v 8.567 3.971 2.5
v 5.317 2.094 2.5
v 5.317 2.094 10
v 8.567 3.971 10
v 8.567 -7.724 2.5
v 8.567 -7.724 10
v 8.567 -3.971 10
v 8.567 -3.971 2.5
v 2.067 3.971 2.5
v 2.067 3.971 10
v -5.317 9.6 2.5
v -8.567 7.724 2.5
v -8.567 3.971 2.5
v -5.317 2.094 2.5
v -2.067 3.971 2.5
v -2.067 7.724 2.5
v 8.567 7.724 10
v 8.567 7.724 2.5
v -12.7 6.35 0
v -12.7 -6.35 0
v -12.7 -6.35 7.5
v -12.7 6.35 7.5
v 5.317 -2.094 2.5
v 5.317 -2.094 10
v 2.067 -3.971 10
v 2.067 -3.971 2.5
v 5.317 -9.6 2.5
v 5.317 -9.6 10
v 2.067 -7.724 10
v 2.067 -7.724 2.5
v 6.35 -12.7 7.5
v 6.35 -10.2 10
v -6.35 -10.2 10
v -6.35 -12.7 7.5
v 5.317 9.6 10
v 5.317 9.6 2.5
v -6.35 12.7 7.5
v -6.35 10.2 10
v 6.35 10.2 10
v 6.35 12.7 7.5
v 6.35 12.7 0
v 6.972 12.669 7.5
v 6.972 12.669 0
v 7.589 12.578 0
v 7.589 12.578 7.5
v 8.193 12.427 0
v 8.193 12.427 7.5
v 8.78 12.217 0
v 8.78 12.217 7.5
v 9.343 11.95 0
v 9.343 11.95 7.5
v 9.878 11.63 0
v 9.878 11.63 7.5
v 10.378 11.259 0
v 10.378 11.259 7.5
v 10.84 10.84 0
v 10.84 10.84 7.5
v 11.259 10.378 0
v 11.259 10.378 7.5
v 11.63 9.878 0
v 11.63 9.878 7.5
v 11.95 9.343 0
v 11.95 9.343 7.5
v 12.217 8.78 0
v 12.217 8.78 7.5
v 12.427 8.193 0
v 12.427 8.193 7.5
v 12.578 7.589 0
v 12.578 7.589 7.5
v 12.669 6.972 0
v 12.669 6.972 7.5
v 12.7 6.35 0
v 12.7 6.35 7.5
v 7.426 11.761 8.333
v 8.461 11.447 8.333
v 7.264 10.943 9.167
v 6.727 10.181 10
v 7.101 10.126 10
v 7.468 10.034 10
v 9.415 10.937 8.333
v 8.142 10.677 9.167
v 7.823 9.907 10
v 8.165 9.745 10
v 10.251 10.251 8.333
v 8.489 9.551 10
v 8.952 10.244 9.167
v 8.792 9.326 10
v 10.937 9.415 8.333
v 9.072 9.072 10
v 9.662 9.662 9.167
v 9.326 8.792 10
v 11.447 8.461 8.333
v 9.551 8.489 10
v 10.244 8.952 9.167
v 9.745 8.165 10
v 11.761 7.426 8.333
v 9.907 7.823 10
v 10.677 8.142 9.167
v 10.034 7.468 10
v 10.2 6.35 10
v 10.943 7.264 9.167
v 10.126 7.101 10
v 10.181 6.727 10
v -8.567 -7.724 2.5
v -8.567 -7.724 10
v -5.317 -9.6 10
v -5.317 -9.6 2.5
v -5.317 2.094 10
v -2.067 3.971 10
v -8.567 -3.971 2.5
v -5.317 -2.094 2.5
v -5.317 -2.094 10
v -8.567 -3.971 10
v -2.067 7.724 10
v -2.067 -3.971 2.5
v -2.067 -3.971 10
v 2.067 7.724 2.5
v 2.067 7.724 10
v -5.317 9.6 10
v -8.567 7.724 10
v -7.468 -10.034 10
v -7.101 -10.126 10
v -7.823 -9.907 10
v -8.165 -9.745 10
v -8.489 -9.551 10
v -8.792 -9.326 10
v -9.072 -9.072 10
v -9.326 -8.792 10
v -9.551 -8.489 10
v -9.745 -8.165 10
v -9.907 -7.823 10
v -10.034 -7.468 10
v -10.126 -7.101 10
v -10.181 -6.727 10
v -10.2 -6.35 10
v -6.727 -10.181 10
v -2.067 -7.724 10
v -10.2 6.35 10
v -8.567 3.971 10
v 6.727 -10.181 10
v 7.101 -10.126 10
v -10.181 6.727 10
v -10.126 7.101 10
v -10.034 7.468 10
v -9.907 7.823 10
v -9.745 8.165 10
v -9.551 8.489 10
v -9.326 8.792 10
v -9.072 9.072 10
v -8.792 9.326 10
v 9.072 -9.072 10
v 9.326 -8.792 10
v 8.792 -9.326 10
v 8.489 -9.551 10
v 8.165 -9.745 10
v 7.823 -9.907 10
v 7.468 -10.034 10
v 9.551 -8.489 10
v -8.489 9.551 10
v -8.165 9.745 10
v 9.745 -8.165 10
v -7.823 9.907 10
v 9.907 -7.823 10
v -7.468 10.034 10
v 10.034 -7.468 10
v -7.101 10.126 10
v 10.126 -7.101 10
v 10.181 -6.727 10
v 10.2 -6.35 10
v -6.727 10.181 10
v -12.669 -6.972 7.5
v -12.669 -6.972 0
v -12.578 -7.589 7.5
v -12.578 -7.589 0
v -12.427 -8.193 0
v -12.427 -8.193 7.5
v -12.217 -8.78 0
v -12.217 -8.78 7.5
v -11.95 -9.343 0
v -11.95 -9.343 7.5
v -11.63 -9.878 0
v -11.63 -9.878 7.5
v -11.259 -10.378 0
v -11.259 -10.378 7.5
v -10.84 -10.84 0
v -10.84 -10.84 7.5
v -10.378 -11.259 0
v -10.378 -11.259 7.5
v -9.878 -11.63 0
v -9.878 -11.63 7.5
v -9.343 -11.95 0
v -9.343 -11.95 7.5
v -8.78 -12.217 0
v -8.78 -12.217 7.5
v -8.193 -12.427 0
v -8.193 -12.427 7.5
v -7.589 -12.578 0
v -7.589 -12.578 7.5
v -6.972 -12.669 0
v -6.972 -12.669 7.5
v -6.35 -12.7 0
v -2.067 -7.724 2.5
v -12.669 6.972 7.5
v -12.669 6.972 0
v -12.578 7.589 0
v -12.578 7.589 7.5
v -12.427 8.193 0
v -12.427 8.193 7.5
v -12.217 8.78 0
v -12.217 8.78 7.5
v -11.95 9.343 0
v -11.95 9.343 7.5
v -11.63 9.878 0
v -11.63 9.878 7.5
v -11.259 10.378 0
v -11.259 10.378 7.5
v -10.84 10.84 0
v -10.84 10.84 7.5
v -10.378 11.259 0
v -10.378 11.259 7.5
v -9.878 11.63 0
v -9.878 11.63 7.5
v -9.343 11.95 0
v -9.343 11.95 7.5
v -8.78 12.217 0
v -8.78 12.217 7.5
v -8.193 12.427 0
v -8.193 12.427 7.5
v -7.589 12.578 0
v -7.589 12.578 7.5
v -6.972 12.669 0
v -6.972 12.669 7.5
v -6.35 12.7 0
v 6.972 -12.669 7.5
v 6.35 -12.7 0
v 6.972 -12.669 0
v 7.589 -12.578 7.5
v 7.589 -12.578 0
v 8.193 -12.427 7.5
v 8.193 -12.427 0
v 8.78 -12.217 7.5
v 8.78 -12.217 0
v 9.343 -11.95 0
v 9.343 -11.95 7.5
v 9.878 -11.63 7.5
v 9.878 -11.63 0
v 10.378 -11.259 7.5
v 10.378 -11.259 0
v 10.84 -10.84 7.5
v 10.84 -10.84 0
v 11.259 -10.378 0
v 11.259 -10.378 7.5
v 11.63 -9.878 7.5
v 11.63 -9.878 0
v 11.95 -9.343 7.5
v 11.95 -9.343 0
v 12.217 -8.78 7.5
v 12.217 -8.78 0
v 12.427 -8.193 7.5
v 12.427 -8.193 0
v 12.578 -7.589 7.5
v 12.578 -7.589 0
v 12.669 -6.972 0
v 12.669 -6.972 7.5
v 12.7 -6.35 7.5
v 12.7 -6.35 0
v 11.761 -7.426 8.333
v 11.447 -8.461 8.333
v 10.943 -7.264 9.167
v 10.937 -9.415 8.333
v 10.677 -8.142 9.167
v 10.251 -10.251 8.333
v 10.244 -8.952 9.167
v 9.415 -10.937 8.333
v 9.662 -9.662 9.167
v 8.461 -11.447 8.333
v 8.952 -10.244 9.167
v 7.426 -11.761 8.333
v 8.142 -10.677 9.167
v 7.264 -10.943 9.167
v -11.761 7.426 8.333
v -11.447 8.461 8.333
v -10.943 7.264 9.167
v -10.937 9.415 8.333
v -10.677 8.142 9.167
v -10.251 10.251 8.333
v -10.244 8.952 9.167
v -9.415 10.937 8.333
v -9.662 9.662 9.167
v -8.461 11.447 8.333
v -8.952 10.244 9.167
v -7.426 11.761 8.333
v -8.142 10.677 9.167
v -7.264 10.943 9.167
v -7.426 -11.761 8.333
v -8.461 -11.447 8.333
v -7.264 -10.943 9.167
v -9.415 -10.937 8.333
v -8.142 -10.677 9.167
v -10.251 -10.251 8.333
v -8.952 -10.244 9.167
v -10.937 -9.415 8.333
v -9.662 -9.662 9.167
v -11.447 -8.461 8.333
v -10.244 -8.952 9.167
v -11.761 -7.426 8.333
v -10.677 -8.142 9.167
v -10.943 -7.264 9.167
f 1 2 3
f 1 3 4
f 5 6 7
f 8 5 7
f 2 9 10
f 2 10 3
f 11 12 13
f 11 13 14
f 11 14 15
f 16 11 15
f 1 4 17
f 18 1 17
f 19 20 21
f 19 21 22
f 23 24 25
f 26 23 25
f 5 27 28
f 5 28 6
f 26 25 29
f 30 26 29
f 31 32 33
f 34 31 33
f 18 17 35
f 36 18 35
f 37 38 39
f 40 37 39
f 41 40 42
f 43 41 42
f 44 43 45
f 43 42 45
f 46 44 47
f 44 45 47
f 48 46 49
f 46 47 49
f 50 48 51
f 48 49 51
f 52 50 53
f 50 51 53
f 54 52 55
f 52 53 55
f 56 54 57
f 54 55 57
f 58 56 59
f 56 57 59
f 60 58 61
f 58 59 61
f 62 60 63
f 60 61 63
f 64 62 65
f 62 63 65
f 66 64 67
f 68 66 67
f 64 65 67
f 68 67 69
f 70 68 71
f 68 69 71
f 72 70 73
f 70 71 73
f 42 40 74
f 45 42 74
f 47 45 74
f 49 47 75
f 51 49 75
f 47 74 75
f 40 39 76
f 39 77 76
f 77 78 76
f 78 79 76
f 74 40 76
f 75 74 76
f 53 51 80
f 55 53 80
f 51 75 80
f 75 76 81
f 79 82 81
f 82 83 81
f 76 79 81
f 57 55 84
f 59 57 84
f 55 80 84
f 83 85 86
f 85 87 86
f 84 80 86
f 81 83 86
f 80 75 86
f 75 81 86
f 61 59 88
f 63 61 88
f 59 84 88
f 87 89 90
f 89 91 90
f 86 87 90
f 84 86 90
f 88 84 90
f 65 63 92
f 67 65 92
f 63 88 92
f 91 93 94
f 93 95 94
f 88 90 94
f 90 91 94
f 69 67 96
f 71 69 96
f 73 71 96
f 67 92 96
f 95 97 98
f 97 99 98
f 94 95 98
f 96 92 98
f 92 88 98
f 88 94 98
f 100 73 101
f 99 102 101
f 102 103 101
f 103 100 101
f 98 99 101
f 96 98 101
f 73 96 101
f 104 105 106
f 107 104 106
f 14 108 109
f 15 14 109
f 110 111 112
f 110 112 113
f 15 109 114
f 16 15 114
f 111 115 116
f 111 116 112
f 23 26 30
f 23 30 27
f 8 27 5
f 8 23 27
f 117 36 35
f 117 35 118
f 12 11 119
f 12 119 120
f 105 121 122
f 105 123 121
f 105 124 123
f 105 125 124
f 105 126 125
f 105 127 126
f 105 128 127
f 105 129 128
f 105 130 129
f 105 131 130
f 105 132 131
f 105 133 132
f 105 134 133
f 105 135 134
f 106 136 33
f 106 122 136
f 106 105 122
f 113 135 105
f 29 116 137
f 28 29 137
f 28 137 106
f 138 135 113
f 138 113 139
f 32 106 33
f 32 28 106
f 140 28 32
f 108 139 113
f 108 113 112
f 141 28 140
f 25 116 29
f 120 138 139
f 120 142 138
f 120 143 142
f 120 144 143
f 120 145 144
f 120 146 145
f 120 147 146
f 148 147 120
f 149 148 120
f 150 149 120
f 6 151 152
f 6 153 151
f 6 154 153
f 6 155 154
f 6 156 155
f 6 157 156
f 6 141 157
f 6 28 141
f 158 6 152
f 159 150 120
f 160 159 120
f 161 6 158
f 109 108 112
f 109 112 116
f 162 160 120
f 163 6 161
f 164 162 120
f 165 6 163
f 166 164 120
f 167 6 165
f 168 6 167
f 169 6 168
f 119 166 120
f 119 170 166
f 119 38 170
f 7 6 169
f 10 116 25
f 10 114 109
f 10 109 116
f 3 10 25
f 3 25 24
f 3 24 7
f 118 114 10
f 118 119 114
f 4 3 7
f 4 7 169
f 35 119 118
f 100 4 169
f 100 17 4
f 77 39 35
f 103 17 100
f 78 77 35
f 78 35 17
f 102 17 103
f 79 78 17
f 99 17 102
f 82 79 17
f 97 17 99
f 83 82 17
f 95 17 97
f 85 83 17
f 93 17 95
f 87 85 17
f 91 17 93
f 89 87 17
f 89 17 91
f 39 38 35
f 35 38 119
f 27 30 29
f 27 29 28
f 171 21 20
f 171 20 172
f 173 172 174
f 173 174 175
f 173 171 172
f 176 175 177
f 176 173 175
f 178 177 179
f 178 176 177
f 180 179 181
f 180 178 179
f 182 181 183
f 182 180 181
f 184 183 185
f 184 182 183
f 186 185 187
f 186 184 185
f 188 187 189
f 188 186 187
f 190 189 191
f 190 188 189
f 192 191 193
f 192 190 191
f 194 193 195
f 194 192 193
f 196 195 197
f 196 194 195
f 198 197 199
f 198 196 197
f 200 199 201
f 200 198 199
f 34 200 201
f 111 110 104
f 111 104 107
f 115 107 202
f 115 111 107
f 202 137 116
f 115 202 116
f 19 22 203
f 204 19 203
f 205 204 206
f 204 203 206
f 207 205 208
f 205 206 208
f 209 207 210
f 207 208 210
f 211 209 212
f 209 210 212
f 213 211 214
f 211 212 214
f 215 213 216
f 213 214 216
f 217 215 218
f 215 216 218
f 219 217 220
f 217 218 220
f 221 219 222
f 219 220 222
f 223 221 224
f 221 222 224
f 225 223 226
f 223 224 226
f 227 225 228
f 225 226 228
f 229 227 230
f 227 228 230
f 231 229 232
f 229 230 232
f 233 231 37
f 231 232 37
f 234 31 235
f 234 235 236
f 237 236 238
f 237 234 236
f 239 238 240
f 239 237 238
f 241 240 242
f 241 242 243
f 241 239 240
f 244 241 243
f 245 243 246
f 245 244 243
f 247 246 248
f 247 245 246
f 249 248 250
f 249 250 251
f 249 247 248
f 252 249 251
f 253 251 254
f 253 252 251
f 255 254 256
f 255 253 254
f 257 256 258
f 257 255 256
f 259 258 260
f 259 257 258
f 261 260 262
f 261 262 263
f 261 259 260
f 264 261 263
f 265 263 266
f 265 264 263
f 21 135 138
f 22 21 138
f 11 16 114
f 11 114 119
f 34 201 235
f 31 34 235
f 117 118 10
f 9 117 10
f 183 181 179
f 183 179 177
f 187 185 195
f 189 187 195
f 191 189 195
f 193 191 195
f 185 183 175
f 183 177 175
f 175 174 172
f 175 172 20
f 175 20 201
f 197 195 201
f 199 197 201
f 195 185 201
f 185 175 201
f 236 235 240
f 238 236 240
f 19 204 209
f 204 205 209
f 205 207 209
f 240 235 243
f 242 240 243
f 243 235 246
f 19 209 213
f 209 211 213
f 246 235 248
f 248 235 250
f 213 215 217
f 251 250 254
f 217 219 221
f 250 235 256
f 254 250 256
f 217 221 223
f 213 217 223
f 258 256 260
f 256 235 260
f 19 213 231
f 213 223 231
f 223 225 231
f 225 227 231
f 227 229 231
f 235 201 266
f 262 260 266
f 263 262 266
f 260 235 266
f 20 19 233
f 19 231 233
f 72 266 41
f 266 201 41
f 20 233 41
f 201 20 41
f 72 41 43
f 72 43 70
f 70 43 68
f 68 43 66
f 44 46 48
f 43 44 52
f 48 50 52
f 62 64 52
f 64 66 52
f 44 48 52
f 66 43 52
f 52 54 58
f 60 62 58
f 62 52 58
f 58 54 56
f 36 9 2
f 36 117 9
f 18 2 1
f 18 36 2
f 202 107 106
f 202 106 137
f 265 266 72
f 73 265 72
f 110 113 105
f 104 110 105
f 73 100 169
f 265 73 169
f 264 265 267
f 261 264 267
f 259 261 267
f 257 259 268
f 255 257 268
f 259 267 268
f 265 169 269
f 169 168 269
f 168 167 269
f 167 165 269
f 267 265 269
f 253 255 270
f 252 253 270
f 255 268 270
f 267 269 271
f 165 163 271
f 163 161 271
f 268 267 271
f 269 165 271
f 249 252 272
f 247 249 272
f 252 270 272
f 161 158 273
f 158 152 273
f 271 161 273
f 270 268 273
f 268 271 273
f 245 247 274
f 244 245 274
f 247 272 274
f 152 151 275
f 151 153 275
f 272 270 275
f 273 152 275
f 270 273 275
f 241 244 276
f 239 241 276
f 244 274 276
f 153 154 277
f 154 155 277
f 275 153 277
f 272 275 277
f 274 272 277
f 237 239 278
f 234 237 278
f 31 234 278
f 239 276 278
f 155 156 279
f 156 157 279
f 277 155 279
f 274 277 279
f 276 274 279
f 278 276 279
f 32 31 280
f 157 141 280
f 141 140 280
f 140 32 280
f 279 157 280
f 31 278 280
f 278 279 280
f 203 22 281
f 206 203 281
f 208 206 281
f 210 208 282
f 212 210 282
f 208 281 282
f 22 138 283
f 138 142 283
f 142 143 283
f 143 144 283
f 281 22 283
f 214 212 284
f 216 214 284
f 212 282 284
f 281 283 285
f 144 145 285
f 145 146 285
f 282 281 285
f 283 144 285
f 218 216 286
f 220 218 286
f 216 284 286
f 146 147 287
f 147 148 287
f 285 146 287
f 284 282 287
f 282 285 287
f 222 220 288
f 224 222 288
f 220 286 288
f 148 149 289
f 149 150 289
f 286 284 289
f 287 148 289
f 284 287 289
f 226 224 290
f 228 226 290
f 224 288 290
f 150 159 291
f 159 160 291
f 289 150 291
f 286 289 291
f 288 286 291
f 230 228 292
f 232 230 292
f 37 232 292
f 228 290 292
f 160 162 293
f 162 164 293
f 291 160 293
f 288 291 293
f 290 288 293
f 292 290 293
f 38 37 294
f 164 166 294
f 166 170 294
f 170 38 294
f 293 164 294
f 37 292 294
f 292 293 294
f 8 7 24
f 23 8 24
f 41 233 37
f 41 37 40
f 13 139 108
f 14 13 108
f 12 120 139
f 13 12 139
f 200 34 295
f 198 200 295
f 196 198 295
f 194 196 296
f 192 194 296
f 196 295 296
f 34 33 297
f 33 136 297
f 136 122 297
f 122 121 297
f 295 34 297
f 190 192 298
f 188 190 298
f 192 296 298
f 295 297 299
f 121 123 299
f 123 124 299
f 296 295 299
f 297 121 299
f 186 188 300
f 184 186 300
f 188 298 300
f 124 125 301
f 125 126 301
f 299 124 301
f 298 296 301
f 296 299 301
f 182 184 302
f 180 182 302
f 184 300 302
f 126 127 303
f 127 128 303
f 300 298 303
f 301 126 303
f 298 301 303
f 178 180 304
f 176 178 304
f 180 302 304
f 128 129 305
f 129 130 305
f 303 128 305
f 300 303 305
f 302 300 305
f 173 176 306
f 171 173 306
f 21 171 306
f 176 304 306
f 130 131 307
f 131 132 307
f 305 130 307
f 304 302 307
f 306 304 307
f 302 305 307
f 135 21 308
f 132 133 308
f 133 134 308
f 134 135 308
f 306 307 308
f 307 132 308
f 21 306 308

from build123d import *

# Parameters (mm, degrees)
F0_W     = 25.4
F0_H     = 25.4
F1_DEPTH = 10
F3_DEPTH = 7.5
F4_R     = 6.35
F5_SIZE  = 2.5


with BuildPart() as f1:
    # F0 (on Top) → F1 (new body)
    with BuildSketch(Plane.XY):
        Rectangle(F0_W, F0_H)
        Polygon((-2.066667, -3.970835), (-2.066667, -7.723612), (-5.316667, -9.6), (-8.566667, -7.723612), (-8.566667, -3.970835), (-5.316667, -2.094447), align=None, mode=Mode.SUBTRACT)
        Polygon((5.316667, -2.094447), (8.566667, -3.970835), (8.566667, -7.723612), (5.316667, -9.6), (2.066667, -7.723612), (2.066667, -3.970835), align=None, mode=Mode.SUBTRACT)
        Polygon((-5.316667, 9.6), (-2.066667, 7.723612), (-2.066667, 3.970835), (-5.316667, 2.094447), (-8.566667, 3.970835), (-8.566667, 7.723612), align=None, mode=Mode.SUBTRACT)
        Polygon((2.066667, 3.970835), (2.066667, 7.723612), (5.316667, 9.6), (8.566667, 7.723612), (8.566667, 3.970835), (5.316667, 2.094447), align=None, mode=Mode.SUBTRACT)
        Polygon((-5.316667, -9.6), (-2.066667, -7.723612), (-2.066667, -3.970835), (-5.316667, -2.094447), (-8.566667, -3.970835), (-8.566667, -7.723612), align=None)
        Polygon((5.316667, 9.6), (2.066667, 7.723612), (2.066667, 3.970835), (5.316667, 2.094447), (8.566667, 3.970835), (8.566667, 7.723612), align=None)
        Polygon((8.566667, -7.723612), (8.566667, -3.970835), (5.316667, -2.094447), (2.066667, -3.970835), (2.066667, -7.723612), (5.316667, -9.6), align=None)
        Polygon((-2.066667, 3.970835), (-2.066667, 7.723612), (-5.316667, 9.6), (-8.566667, 7.723612), (-8.566667, 3.970835), (-5.316667, 2.094447), align=None)
    extrude(amount=F1_DEPTH)

    # F2 (on face) → F3 (cut)
    with BuildSketch(Plane.XY.offset(10)):
        Polygon((-5.316667, 9.6), (-8.566667, 7.723612), (-8.566667, 3.970835), (-5.316667, 2.094447), (-2.066667, 3.970835), (-2.066667, 7.723612), align=None)
        Polygon((2.066667, 3.970835), (5.316667, 2.094447), (8.566667, 3.970835), (8.566667, 7.723612), (5.316667, 9.6), (2.066667, 7.723612), align=None)
        Polygon((5.316667, -2.094447), (2.066667, -3.970835), (2.066667, -7.723612), (5.316667, -9.6), (8.566667, -7.723612), (8.566667, -3.970835), align=None)
        Polygon((-5.316667, -2.094447), (-8.566667, -3.970835), (-8.566667, -7.723612), (-5.316667, -9.6), (-2.066667, -7.723612), (-2.066667, -3.970835), align=None)
    extrude(amount=-F3_DEPTH, mode=Mode.SUBTRACT)

    # F4
    f4_edges = [f1.edges().sort_by_distance(p)[0] for p in [
        (-12.7, -12.7, 5),
        (12.7, -12.7, 5),
        (12.7, 12.7, 5),
        (-12.7, 12.7, 5),
    ]]
    fillet(f4_edges, radius=F4_R)

    # F5
    f5_edges = [f1.edges().sort_by_distance(p)[0] for p in [
        (-12.7, 0, 10),
        (0, -12.7, 10),
        (12.7, 0, 10),
        (0, 12.7, 10),
    ]]
    chamfer(f5_edges, length=F5_SIZE)


solid = f1.part
